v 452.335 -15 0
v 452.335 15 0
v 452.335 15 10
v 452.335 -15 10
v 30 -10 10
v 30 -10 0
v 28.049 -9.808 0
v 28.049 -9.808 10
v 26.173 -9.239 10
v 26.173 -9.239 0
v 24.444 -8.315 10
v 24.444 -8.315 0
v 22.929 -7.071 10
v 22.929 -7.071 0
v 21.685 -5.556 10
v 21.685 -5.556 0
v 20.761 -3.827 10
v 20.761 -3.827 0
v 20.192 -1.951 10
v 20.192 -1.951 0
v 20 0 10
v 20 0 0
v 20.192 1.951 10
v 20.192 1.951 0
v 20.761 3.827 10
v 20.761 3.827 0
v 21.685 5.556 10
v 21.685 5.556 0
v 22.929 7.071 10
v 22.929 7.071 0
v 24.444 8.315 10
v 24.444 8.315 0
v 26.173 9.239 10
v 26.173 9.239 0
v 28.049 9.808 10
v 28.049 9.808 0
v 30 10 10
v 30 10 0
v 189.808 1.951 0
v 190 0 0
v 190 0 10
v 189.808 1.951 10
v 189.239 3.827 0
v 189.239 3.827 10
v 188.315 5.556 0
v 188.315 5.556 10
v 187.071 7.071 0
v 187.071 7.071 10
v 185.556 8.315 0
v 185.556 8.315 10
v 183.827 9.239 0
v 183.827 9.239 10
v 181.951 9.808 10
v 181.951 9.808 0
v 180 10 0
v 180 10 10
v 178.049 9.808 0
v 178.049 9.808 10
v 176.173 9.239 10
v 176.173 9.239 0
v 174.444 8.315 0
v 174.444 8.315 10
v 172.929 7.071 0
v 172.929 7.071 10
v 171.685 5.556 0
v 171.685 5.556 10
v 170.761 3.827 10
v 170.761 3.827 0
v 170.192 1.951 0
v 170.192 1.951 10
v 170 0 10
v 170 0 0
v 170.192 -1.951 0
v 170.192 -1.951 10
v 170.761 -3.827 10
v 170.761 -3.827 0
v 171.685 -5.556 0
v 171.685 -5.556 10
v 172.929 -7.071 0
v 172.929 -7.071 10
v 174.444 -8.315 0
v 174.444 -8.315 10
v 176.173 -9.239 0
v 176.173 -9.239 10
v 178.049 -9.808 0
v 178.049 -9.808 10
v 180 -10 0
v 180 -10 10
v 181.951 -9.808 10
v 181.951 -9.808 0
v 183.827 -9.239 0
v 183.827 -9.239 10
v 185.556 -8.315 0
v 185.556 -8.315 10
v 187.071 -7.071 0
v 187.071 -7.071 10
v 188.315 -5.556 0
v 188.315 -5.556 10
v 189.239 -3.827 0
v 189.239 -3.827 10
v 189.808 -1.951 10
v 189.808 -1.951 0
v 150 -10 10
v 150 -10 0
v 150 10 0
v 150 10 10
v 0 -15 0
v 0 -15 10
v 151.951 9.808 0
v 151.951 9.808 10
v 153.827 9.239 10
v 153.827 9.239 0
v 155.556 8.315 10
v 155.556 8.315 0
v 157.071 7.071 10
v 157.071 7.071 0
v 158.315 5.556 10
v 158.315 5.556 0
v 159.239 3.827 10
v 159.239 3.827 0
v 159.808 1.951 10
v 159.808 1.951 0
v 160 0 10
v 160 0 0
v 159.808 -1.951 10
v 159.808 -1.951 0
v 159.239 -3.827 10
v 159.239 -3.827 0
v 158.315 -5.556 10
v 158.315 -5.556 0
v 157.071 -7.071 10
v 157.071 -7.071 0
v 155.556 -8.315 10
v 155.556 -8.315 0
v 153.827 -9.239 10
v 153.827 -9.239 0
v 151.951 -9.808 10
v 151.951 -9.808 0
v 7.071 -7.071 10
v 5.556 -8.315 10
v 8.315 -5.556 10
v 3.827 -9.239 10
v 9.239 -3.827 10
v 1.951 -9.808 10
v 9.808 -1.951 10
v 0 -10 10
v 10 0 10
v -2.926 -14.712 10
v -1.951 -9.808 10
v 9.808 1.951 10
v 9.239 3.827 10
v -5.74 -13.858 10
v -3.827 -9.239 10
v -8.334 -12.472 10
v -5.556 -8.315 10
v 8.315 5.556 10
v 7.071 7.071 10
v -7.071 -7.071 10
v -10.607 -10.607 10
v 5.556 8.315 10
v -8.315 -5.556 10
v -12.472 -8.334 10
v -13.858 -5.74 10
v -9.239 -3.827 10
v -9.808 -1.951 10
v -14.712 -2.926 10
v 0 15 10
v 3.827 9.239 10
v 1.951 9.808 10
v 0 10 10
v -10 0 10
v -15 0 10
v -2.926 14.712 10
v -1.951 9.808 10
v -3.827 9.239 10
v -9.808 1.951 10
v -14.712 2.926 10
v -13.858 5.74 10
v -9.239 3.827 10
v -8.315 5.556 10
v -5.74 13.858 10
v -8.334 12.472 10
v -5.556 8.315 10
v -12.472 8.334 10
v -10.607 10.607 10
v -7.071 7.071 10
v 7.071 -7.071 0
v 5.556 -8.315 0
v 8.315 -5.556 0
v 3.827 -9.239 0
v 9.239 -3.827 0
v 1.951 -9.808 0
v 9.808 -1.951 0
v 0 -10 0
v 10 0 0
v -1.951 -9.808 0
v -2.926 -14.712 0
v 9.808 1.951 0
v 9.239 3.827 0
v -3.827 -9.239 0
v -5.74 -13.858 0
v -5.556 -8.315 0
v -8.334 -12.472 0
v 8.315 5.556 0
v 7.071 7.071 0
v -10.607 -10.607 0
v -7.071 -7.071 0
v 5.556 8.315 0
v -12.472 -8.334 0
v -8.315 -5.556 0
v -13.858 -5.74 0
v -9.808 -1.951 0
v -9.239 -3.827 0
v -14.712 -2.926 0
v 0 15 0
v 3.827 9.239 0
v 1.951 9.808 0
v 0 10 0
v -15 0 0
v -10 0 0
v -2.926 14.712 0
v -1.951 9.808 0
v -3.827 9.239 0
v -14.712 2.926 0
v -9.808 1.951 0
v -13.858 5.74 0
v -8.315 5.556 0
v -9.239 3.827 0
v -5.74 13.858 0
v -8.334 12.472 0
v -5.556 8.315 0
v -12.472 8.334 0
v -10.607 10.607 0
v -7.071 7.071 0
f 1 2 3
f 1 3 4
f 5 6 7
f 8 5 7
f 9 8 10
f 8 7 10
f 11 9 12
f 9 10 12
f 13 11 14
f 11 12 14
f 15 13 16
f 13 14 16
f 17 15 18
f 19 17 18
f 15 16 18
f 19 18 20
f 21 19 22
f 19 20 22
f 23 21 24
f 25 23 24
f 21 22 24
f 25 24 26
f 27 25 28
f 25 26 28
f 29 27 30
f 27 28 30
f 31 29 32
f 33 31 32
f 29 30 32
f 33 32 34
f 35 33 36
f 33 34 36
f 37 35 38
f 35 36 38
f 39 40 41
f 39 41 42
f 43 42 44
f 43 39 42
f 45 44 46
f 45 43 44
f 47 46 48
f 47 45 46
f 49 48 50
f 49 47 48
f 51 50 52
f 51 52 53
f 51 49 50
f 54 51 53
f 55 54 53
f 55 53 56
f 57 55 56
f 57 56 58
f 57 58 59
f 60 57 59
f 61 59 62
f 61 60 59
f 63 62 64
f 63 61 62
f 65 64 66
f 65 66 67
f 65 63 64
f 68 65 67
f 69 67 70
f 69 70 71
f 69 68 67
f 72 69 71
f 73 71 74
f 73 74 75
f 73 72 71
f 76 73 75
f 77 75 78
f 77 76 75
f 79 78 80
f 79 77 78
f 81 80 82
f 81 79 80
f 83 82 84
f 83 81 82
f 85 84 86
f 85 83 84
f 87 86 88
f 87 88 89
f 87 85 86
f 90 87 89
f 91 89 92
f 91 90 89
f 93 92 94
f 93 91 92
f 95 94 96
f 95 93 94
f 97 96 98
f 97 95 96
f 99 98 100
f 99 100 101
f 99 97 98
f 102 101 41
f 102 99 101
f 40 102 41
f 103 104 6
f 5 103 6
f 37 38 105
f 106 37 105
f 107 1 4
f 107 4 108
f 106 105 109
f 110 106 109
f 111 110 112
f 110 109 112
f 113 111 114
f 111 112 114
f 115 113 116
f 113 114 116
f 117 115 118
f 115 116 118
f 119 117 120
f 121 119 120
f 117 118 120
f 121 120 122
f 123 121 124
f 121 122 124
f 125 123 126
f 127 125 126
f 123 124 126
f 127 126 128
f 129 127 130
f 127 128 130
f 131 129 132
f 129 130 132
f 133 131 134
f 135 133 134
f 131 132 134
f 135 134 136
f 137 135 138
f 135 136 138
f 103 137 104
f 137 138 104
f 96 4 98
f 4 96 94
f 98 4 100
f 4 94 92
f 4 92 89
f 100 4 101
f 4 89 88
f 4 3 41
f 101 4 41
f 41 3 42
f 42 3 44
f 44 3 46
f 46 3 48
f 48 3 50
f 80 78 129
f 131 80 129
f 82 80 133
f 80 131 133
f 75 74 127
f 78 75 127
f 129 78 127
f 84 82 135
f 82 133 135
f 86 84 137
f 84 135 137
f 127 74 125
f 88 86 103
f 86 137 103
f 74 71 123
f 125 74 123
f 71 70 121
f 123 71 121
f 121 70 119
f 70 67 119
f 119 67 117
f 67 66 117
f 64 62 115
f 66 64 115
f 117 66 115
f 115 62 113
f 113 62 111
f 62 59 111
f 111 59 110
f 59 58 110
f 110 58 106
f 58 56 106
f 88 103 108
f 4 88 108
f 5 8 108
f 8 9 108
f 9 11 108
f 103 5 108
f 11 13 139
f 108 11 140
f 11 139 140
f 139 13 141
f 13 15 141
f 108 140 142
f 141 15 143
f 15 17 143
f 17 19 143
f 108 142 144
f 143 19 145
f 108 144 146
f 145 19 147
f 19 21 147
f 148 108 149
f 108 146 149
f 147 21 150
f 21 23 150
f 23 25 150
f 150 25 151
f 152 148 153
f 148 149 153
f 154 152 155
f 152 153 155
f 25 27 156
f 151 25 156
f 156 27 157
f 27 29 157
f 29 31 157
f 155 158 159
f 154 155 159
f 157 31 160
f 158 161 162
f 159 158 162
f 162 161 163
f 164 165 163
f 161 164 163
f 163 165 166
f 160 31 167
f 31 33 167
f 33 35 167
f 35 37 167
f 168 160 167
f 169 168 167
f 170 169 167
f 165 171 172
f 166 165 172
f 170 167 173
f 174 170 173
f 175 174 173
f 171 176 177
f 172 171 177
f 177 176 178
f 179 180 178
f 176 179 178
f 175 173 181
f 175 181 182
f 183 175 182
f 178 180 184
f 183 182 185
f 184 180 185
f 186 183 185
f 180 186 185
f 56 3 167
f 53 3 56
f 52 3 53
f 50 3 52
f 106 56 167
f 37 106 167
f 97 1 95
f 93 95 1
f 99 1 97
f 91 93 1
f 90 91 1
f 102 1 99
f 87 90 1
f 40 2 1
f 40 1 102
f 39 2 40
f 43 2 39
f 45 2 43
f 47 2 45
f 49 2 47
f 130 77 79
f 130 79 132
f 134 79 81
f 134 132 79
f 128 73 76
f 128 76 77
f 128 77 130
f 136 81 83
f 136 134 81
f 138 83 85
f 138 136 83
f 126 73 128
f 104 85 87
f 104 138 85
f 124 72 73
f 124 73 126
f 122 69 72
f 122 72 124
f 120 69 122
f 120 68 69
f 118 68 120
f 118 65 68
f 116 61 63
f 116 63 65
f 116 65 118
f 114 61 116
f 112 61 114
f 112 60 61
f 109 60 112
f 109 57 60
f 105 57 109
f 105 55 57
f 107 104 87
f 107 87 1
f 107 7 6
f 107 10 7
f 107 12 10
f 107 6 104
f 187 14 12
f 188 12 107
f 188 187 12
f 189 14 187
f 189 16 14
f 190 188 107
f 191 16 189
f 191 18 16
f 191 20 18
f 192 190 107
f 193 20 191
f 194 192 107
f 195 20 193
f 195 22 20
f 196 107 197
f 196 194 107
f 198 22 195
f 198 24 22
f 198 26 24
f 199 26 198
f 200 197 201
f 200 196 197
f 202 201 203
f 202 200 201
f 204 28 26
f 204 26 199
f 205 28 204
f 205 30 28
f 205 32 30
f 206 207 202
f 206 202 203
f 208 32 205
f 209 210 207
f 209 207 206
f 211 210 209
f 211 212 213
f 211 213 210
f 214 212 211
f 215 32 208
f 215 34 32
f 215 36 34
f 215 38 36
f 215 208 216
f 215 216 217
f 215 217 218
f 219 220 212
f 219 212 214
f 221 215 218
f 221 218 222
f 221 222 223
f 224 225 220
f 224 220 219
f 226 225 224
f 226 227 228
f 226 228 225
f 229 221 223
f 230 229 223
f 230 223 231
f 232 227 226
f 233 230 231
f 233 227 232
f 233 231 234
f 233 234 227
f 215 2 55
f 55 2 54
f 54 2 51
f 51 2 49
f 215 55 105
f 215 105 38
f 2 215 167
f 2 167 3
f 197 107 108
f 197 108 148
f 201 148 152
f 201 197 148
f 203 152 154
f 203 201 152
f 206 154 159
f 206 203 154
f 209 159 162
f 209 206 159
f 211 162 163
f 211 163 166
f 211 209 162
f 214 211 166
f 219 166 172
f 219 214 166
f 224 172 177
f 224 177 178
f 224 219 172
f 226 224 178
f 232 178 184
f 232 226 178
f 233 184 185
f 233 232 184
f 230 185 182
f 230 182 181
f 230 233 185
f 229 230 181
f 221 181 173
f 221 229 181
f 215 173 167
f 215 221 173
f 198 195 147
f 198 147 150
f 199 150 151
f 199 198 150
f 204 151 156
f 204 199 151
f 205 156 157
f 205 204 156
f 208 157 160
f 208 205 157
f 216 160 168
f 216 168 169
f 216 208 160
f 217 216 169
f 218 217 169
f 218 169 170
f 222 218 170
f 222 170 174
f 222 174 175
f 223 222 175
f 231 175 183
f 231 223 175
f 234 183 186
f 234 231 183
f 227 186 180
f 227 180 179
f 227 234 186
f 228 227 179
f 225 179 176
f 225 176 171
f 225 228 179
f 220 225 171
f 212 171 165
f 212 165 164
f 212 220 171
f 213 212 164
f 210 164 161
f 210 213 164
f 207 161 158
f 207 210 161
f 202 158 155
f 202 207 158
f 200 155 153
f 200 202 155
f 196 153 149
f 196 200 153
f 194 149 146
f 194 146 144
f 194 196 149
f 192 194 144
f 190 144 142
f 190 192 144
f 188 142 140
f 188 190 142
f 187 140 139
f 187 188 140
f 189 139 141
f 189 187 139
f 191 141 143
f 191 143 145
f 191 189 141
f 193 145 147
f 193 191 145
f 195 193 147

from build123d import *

# Parameters (mm, degrees)
SKETCH1_R           = 10
BOSS_EXTRUDE1_DEPTH = 10


with BuildPart() as part:
    # Sketch1 → Boss-Extrude1 (new body)
    with BuildSketch(Plane.XY):
        with BuildLine():
            Line((0, 15), (180, 15))
            Line((180, 15), (452.334951872, 15))
            Line((452.334951872, 15), (452.334951872, -15))
            Line((452.334951872, -15), (180, -15))
            Line((180, -15), (0, -15))
            ThreePointArc((0, -15), (-15, 0), (0, 15))
        make_face()
        Circle(SKETCH1_R, mode=Mode.SUBTRACT)
        with Locations((180, 0)):
            Circle(SKETCH1_R, mode=Mode.SUBTRACT)
        with BuildLine():
            Line((30, 10), (150, 10))
            ThreePointArc((150, 10), (160, 0), (150, -10))
            Line((150, -10), (30, -10))
            ThreePointArc((30, -10), (20, 0), (30, 10))
        make_face(mode=Mode.SUBTRACT)
    extrude(amount=BOSS_EXTRUDE1_DEPTH)


solid = part.part
